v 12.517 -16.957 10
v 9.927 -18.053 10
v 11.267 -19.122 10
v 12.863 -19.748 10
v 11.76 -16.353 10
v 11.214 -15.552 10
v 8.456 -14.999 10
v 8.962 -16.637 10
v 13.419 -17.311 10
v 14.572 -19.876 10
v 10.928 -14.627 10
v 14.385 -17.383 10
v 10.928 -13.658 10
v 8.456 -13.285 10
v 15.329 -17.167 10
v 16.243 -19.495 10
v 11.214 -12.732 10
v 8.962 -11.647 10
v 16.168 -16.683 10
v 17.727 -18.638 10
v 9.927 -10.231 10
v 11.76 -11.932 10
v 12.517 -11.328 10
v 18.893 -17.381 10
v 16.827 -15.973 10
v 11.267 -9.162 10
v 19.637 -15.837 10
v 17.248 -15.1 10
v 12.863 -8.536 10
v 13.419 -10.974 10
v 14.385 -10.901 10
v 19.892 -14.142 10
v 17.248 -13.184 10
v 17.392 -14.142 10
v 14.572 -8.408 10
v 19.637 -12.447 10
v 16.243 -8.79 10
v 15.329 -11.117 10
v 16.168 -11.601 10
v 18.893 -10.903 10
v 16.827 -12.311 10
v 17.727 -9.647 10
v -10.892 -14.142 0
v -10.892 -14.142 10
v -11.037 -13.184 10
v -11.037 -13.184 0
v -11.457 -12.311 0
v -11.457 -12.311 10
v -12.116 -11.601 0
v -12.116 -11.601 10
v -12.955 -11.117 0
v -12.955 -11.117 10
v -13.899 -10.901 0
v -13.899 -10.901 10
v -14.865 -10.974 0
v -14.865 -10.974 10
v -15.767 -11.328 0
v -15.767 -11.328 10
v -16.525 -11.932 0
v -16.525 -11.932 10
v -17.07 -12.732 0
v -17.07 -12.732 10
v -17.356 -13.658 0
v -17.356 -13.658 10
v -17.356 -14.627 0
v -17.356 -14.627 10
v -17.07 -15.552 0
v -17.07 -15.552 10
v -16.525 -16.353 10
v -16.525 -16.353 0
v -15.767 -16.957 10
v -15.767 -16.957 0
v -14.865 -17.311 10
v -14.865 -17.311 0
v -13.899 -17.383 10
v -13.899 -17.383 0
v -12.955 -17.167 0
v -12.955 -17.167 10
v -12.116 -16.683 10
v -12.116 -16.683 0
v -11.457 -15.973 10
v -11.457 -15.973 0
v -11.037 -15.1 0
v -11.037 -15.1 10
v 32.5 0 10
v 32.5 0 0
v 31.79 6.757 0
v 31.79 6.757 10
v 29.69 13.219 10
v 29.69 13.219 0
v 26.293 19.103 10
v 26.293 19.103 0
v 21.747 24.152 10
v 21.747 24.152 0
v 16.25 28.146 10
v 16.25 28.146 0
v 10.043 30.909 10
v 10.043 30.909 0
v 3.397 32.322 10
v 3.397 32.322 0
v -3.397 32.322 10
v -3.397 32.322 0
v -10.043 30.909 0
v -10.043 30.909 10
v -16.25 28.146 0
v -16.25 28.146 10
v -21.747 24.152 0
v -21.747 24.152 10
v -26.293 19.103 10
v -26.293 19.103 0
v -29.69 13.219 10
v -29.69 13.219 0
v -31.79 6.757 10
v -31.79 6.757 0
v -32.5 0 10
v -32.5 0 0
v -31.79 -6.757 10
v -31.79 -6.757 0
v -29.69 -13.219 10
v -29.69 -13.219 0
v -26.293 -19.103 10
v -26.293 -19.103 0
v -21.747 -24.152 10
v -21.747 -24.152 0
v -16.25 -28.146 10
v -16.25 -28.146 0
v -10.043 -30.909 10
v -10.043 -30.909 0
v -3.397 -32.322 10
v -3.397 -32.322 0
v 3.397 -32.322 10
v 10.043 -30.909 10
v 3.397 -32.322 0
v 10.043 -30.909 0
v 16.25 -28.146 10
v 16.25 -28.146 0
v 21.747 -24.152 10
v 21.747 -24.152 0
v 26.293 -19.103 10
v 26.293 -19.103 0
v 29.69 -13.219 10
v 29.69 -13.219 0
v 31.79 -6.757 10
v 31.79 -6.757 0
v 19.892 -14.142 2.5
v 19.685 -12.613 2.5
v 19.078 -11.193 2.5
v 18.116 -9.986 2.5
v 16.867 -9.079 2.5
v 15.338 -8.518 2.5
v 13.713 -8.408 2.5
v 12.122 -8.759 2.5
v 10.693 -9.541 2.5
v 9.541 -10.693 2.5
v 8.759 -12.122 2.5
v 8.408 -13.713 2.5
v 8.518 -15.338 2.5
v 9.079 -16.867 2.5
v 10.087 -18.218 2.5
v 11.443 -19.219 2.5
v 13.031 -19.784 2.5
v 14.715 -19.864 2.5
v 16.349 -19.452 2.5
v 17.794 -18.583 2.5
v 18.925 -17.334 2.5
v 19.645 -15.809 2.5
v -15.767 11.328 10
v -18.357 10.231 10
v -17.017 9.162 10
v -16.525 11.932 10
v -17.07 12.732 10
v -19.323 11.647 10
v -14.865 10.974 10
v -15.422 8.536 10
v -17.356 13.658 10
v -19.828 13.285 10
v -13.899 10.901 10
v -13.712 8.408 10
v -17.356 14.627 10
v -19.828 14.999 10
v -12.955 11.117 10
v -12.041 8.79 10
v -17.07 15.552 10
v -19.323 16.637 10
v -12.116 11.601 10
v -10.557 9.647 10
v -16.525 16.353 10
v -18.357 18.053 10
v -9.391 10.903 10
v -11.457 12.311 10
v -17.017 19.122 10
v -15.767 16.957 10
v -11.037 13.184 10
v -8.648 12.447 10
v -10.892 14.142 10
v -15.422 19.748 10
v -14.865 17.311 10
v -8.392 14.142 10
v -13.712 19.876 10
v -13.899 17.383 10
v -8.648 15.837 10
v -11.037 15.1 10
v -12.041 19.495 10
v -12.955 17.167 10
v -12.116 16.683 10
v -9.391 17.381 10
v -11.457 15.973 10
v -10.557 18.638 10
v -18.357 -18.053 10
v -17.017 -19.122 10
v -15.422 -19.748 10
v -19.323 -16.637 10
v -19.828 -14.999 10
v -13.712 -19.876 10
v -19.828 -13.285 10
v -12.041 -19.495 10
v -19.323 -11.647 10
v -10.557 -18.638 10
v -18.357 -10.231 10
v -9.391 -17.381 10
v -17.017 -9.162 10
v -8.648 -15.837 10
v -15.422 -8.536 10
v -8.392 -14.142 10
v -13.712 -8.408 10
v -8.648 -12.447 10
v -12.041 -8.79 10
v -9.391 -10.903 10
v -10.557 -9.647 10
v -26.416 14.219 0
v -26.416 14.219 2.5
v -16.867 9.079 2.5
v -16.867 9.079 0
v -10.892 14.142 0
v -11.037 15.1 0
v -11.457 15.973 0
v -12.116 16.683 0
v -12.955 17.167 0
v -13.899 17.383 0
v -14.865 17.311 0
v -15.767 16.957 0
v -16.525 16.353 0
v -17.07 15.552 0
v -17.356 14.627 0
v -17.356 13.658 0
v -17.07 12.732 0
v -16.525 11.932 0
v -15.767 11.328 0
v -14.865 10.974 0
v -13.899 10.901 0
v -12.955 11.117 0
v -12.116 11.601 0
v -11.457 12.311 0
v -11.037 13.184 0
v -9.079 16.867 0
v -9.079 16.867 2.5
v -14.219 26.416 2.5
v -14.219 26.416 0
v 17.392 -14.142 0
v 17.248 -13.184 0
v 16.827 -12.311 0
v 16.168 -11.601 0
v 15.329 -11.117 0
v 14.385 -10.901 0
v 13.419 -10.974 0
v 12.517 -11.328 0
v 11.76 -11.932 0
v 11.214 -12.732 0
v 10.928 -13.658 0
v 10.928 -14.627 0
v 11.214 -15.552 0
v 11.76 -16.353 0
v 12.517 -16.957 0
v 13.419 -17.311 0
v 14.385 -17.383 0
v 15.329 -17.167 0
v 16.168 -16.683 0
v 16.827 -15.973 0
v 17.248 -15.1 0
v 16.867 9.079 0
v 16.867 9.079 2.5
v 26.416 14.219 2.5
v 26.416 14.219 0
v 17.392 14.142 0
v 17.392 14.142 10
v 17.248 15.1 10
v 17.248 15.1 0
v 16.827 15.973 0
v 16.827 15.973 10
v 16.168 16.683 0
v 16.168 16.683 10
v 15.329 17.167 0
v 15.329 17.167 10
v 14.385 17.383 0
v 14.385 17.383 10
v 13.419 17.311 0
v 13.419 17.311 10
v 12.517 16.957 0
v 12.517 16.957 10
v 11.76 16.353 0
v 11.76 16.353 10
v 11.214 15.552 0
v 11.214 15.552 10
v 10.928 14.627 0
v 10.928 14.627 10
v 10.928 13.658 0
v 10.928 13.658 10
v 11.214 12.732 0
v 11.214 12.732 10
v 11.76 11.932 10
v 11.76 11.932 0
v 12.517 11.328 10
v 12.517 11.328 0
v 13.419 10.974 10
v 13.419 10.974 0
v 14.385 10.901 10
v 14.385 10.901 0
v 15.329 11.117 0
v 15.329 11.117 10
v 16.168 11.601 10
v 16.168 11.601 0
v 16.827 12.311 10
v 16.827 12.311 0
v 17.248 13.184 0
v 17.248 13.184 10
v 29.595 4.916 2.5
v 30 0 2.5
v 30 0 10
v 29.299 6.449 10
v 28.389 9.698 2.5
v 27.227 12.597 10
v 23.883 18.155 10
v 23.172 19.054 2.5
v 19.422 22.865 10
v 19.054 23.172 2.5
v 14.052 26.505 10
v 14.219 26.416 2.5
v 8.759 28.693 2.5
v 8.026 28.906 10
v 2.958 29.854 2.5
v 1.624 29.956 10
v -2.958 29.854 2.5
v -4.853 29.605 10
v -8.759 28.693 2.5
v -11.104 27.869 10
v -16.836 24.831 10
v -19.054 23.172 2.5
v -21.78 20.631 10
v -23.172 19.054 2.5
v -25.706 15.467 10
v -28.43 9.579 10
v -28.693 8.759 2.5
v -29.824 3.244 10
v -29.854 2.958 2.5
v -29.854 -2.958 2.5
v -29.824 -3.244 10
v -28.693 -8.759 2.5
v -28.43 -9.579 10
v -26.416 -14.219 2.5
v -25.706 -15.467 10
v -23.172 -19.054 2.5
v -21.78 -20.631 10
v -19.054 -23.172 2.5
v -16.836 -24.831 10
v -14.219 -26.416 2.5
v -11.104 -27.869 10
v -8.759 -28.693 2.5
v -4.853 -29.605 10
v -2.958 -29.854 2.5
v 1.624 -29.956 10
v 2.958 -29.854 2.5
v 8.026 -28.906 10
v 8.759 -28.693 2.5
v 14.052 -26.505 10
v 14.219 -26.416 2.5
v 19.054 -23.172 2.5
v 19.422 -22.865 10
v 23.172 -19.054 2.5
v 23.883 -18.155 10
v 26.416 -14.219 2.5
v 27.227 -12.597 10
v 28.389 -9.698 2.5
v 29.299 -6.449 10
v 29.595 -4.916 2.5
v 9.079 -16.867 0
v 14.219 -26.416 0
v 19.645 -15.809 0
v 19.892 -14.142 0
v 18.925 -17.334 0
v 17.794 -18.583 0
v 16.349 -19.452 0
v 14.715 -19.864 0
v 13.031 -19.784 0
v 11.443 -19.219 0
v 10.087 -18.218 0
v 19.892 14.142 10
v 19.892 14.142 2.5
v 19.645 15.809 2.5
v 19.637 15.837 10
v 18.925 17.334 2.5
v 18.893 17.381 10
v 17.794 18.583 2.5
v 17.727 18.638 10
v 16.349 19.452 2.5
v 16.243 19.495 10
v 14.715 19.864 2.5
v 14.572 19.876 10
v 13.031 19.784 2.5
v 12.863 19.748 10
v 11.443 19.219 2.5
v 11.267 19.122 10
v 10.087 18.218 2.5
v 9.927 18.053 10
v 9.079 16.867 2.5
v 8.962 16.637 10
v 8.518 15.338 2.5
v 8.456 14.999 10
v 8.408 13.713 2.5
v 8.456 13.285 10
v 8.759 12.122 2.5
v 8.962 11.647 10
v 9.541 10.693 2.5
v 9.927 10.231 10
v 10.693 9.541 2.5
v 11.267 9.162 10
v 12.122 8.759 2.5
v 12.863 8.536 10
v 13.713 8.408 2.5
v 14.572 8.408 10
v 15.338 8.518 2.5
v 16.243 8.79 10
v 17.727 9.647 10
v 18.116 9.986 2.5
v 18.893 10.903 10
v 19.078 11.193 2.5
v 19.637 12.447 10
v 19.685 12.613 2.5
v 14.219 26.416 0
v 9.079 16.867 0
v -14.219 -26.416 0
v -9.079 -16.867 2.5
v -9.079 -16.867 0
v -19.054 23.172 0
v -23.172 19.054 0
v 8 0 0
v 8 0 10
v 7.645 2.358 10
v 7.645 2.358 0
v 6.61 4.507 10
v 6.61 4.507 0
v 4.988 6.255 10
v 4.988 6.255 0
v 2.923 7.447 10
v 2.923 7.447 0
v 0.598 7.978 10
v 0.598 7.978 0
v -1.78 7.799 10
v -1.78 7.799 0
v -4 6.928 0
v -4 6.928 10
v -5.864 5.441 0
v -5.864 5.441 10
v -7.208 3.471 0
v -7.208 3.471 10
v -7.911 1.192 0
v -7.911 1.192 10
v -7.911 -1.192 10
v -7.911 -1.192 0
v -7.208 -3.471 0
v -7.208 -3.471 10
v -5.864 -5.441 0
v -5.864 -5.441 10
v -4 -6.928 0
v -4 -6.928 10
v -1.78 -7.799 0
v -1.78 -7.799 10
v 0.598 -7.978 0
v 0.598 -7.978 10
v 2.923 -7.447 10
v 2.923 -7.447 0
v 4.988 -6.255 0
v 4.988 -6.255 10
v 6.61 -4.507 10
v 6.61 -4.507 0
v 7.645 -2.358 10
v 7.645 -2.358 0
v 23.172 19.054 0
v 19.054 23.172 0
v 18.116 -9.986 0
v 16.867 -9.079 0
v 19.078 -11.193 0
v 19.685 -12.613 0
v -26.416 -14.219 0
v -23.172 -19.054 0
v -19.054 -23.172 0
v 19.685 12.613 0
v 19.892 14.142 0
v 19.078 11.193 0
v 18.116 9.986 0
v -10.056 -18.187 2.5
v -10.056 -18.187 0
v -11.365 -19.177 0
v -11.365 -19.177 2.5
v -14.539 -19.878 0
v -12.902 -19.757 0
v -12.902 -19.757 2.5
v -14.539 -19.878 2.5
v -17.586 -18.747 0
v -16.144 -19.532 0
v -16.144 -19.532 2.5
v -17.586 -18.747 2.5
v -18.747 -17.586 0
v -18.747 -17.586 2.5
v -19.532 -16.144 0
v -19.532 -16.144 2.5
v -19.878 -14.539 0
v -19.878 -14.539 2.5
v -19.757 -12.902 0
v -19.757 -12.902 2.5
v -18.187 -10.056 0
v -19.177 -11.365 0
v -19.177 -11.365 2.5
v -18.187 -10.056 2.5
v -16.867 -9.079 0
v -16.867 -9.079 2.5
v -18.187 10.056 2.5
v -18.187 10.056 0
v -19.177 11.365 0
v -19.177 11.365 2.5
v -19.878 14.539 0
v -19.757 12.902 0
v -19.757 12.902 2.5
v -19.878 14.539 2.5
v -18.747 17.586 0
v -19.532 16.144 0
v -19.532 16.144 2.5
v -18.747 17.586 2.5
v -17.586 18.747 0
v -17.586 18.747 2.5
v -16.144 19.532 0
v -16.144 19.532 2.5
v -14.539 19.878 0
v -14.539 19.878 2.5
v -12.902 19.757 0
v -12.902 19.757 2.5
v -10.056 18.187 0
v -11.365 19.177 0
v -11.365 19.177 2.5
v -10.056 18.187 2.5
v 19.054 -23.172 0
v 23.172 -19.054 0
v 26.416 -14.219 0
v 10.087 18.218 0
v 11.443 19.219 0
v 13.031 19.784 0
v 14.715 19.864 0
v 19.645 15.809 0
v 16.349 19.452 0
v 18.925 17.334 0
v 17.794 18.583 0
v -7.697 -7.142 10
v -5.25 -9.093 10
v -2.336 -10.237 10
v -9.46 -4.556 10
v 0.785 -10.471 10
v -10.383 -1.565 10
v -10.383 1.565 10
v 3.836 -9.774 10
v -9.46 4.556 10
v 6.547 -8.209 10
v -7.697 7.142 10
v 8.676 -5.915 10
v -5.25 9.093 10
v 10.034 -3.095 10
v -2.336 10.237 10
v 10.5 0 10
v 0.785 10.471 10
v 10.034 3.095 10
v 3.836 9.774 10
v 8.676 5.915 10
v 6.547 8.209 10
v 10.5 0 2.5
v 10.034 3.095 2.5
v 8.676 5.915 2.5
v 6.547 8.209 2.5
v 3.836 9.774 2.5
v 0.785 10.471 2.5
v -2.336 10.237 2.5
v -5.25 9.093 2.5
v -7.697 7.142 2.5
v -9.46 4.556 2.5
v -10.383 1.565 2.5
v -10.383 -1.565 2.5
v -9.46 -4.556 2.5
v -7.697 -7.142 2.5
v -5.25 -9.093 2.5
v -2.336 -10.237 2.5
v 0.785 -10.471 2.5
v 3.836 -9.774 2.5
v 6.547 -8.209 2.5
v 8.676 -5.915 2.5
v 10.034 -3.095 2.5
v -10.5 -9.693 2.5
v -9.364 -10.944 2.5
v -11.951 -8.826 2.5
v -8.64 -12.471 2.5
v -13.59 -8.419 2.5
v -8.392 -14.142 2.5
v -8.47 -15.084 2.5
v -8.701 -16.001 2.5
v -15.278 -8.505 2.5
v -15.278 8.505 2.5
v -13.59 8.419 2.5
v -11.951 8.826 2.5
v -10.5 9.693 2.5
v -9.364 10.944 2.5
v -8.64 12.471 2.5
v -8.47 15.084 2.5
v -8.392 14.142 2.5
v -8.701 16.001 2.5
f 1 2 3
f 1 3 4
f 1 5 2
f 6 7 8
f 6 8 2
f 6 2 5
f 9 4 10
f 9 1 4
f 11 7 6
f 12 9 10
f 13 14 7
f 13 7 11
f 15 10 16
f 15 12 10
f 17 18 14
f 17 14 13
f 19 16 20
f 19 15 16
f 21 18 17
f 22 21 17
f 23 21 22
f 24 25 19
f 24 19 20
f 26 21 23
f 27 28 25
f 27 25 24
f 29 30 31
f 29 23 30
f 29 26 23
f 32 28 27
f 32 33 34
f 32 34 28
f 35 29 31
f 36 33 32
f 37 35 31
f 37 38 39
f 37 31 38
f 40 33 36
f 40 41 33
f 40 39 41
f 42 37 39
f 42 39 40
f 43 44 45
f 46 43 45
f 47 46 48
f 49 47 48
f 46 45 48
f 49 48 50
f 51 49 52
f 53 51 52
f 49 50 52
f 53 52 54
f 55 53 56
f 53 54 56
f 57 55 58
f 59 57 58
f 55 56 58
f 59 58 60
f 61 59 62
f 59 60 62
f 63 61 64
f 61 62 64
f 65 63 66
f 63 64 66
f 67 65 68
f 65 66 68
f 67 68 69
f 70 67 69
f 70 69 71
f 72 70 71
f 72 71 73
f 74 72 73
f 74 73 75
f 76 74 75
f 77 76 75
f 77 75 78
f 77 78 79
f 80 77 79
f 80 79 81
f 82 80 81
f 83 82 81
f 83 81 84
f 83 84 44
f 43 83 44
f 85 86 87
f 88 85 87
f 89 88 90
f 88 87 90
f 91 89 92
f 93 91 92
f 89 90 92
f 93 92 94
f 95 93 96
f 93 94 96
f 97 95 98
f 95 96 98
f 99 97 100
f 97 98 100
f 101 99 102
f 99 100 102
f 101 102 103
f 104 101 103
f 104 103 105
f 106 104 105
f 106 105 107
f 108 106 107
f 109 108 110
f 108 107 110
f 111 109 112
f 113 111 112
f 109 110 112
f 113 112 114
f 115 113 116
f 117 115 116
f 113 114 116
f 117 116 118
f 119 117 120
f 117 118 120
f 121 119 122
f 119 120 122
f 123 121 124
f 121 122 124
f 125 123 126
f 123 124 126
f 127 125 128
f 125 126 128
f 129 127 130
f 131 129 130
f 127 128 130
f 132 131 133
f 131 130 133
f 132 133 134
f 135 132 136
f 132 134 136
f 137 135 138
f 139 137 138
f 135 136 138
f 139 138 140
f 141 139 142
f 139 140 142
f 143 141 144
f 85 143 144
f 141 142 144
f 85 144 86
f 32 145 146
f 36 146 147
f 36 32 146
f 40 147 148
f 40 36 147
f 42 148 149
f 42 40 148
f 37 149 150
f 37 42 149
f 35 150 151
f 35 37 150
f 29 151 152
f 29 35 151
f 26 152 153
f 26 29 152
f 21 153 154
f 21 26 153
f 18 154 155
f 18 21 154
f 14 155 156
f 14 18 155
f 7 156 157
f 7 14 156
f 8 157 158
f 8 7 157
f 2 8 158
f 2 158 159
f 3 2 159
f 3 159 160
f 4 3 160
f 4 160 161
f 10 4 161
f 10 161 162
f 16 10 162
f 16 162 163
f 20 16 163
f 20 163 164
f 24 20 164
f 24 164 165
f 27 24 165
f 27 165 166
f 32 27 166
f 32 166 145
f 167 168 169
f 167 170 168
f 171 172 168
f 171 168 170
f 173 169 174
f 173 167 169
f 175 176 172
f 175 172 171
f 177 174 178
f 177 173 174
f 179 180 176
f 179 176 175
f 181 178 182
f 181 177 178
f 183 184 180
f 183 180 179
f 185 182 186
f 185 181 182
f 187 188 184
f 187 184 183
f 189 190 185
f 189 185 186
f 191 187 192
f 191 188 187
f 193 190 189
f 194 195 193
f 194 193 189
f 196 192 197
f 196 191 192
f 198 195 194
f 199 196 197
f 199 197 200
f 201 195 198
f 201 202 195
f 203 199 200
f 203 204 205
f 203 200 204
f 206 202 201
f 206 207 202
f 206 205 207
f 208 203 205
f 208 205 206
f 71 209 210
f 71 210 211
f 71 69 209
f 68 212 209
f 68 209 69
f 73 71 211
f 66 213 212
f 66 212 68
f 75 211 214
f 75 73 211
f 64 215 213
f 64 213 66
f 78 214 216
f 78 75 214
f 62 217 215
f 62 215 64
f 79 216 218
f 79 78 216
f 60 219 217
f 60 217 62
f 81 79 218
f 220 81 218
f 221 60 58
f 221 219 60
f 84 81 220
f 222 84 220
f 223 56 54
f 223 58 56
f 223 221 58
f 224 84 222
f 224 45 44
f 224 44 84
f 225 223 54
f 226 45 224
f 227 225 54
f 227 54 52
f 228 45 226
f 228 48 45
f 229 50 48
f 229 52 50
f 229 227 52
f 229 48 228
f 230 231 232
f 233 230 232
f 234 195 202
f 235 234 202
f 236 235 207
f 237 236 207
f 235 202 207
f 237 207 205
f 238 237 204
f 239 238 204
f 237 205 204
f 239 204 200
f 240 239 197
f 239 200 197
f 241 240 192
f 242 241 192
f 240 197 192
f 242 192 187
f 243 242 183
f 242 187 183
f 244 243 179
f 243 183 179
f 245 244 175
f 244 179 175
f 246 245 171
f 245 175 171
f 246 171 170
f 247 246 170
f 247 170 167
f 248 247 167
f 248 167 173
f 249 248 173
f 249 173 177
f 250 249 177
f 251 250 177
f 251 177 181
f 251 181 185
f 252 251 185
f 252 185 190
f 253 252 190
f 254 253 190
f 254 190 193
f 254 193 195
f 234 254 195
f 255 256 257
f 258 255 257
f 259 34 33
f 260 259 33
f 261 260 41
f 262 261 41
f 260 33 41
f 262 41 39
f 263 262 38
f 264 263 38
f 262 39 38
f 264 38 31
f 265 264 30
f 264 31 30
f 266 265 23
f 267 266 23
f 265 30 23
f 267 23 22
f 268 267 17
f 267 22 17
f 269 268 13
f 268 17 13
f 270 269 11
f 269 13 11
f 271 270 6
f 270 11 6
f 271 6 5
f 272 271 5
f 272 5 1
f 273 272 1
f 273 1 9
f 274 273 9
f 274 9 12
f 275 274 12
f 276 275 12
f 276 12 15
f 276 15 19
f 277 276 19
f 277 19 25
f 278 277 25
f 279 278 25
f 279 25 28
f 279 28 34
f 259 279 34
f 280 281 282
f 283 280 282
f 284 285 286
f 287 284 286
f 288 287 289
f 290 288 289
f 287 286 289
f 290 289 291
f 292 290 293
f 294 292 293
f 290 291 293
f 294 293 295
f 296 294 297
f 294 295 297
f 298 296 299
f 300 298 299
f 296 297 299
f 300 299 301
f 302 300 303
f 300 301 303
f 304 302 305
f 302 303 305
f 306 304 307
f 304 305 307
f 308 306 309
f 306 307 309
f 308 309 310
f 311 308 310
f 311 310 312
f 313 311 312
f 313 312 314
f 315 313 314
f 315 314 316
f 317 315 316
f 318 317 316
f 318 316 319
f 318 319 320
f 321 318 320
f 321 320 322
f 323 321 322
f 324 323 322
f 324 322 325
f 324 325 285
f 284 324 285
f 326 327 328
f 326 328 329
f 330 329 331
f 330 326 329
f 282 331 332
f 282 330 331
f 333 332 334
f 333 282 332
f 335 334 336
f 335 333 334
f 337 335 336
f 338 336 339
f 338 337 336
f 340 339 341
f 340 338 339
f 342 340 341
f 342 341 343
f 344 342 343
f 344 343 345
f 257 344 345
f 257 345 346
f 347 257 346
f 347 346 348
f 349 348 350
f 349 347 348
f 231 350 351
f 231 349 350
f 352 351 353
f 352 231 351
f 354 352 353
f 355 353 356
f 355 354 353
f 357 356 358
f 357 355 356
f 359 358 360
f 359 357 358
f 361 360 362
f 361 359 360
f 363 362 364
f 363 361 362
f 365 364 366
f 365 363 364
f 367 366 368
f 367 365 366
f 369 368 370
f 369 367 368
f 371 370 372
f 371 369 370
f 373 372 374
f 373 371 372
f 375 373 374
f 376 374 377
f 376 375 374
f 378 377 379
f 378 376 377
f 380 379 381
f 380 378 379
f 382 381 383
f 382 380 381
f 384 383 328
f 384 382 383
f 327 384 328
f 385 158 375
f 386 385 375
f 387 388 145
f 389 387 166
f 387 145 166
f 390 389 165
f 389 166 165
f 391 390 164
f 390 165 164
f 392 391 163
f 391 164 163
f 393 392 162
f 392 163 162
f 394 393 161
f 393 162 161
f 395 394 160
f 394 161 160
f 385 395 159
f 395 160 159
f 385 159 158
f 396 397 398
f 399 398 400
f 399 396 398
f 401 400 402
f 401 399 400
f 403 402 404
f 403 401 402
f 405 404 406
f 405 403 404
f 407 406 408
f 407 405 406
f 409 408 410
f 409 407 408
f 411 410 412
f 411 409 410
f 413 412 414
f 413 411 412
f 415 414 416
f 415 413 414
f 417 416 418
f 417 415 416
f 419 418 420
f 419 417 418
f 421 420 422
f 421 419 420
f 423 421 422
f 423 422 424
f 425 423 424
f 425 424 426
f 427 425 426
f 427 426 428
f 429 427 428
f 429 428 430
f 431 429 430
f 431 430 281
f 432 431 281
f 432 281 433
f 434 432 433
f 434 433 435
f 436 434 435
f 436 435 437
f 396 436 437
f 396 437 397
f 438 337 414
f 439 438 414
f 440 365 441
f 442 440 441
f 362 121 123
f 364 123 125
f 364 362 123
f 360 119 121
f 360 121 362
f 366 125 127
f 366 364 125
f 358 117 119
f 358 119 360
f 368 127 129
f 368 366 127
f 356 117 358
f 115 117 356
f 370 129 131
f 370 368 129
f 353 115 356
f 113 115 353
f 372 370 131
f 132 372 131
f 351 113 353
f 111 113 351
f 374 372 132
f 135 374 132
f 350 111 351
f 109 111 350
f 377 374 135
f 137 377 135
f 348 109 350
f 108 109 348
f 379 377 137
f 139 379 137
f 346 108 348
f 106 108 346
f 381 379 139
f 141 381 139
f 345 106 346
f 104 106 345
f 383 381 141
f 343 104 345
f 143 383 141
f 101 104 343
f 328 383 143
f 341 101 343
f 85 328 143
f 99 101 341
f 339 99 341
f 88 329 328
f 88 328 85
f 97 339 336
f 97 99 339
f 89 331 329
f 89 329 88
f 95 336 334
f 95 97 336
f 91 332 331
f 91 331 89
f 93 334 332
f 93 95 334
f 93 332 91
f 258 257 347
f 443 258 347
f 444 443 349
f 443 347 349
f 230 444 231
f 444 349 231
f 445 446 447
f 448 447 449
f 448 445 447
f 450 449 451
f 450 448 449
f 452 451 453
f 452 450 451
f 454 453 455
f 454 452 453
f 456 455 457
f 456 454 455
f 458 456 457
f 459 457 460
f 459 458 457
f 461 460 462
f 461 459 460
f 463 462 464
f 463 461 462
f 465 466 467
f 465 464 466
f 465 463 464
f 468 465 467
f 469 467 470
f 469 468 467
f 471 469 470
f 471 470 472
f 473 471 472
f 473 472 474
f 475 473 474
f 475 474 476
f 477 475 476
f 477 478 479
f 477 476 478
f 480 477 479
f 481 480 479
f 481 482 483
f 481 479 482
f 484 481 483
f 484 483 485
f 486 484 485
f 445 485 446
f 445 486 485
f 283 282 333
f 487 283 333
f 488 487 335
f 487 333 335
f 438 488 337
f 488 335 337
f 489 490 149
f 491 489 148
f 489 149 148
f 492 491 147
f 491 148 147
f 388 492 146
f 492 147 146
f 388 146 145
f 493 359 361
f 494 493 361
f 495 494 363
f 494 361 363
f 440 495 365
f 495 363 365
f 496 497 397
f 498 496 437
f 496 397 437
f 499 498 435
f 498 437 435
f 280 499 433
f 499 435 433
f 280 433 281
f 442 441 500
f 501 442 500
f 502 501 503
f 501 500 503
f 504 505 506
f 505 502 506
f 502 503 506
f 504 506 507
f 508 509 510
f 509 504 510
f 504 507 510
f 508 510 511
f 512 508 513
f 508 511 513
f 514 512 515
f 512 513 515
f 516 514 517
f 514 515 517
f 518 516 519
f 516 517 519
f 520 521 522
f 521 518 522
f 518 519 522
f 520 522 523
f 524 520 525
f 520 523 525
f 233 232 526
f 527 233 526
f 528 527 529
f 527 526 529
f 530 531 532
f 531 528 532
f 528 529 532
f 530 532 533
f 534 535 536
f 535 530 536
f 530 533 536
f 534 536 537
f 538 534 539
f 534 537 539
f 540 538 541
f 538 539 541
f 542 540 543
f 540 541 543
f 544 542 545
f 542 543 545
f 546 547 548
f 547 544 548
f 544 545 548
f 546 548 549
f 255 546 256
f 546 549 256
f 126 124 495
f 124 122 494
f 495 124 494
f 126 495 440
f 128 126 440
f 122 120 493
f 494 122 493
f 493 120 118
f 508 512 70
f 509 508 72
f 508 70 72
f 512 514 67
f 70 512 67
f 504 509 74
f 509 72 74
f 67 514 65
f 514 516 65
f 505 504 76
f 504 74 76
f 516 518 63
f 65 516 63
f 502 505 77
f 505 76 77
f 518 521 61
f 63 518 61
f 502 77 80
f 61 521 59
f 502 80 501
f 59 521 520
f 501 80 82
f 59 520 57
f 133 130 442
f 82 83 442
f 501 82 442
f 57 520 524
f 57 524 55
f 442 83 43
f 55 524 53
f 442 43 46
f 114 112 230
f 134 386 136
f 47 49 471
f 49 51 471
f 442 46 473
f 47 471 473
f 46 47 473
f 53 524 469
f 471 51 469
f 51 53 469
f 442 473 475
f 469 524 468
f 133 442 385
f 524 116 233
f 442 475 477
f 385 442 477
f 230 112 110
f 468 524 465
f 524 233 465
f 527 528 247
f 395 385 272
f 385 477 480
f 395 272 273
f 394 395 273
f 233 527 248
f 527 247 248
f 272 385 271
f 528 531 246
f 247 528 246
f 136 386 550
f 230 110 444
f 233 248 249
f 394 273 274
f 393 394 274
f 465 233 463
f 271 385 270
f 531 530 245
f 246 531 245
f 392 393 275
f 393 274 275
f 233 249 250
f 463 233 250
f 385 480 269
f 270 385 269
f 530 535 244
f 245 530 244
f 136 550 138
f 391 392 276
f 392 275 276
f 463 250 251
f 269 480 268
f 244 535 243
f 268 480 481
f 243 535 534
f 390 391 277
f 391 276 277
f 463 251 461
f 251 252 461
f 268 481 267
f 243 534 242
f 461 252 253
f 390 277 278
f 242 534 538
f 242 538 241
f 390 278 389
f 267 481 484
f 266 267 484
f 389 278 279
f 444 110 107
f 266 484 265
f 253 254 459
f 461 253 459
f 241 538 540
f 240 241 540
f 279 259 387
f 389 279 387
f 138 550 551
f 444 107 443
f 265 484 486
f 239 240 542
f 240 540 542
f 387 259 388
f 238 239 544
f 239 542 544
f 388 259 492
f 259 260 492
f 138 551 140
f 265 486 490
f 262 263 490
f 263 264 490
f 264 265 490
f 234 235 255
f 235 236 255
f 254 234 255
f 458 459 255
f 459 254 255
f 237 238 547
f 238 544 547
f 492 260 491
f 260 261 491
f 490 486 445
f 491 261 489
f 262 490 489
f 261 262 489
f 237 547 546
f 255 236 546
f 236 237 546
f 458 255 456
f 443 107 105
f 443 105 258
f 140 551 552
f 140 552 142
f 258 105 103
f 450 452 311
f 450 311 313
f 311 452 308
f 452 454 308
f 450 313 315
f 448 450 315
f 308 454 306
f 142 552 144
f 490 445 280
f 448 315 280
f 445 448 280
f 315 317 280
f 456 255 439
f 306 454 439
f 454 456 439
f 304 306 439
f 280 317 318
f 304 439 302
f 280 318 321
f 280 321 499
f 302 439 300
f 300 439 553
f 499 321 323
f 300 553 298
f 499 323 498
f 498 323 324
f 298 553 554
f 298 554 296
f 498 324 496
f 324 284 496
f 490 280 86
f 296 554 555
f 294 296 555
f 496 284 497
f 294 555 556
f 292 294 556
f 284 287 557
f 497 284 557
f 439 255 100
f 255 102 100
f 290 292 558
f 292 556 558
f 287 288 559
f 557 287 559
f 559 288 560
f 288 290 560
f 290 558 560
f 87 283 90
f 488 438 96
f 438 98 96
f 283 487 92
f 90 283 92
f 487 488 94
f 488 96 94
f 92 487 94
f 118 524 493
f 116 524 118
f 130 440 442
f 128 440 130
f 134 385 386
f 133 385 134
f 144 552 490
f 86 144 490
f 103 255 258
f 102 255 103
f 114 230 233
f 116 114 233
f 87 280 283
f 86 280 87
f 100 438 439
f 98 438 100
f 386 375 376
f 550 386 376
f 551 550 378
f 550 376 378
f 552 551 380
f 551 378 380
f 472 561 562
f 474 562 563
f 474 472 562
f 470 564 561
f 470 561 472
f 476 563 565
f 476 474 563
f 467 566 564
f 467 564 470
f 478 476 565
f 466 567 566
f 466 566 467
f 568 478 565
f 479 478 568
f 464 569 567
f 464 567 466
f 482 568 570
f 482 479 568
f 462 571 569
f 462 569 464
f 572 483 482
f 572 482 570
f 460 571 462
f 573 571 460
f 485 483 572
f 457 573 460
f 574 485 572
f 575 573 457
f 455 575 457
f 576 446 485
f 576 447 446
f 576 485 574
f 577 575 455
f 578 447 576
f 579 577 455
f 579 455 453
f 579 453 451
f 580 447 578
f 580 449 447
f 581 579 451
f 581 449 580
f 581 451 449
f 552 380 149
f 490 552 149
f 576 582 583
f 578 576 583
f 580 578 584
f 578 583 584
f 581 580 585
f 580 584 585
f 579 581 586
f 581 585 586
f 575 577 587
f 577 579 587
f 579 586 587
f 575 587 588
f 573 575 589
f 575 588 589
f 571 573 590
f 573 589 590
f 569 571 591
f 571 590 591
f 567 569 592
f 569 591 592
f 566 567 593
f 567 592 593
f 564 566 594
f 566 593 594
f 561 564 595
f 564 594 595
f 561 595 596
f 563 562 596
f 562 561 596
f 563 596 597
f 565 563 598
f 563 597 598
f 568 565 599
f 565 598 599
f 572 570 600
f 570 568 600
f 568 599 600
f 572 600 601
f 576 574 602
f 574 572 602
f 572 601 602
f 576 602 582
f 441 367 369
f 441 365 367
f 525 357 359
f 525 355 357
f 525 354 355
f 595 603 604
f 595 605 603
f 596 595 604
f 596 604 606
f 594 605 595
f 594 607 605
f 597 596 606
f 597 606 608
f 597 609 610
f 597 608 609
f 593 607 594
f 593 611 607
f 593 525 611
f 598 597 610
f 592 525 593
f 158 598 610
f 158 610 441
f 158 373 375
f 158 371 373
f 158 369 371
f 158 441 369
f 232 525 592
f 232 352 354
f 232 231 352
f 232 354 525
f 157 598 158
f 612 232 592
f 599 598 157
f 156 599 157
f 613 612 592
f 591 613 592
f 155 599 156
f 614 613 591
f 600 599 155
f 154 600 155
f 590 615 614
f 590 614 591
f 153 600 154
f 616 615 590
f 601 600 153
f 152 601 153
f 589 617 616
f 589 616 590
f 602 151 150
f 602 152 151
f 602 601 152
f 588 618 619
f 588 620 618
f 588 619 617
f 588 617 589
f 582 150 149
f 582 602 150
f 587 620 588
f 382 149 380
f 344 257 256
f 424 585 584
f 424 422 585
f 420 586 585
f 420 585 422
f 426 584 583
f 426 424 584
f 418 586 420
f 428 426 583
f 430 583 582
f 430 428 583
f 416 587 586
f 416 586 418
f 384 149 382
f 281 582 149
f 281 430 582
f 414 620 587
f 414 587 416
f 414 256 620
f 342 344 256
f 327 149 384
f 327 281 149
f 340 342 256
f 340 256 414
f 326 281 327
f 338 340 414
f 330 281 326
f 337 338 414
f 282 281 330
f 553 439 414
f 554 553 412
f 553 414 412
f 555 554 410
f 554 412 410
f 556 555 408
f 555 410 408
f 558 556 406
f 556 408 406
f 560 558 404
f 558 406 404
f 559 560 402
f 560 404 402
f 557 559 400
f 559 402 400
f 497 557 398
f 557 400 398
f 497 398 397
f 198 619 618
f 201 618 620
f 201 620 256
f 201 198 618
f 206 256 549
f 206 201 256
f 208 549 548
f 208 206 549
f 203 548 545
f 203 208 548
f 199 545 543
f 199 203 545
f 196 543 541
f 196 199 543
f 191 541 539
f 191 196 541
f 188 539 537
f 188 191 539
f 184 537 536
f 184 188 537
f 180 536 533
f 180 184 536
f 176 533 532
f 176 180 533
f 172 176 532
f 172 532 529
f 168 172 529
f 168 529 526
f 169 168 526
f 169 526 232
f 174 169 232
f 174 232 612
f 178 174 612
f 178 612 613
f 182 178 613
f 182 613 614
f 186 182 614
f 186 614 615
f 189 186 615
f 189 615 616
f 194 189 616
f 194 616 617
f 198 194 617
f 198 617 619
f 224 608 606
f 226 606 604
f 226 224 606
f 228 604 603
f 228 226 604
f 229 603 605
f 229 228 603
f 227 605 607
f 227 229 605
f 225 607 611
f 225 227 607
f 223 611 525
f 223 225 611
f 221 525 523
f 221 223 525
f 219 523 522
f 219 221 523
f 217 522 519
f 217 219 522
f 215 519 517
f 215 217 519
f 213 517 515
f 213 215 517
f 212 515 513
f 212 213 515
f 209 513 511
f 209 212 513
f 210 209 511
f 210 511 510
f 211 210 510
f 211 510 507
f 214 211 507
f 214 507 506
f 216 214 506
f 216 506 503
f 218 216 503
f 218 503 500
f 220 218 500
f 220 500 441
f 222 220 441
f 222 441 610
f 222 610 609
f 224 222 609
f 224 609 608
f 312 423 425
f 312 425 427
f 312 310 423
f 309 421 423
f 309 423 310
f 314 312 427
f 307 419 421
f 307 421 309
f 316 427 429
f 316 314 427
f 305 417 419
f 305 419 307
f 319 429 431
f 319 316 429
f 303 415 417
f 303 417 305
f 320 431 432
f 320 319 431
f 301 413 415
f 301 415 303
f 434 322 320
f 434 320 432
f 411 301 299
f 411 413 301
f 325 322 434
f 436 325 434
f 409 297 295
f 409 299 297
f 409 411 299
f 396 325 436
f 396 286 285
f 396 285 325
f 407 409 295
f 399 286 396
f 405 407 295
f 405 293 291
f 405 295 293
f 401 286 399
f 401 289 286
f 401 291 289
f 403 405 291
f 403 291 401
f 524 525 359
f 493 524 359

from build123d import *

# Parameters (mm, degrees)
F0_R     = 32.5
F1_DEPTH = 10
F2_R     = 8
F3_DEPTH = 25
F4_R     = 3.25
F5_DEPTH = 25
F6_T     = -2.5
F8_DEPTH = 25


with BuildPart() as f1:
    # F0 (on Top) → F1 (new body)
    with BuildSketch(Plane.XY):
        Circle(F0_R)
    extrude(amount=F1_DEPTH)

    # F2 (on Top) → F3 (cut)
    with BuildSketch(Plane.XY):
        Circle(F2_R)
    extrude(amount=F3_DEPTH, mode=Mode.SUBTRACT)

    # F4 (on face) → F5 (cut)
    with BuildSketch(Plane.XY.offset(10)):
        with Locations((-14.1421356237, 14.1421356237)):
            Circle(F4_R)
        with Locations((-14.1421356237, -14.1421356237)):
            Circle(F4_R)
        with Locations((14.1421356237, 14.1421356237)):
            Circle(F4_R)
        with Locations((14.1421356237, -14.1421356237)):
            Circle(F4_R)
    extrude(amount=-F5_DEPTH, mode=Mode.SUBTRACT)

    # F6
    f6_openings = [f1.faces().sort_by_distance(p)[0] for p in [
        (-31.580761, 0, 10),
    ]]
    offset(amount=F6_T, openings=f6_openings)

    # F7 (on face) → F8 (cut)
    with BuildSketch(Plane.XY.offset(2.5)):
        with BuildLine():
            ThreePointArc((19.8921356237, 14.1421356237), (19.0783691058, 11.1932207368), (16.8674055331, 9.0789939191))
            Line((16.8674055331, 9.0789939191), (26.4163915025, 14.218799527))
            ThreePointArc((26.4163915025, 14.218799527), (21.2132034356, 21.2132034356), (14.218799527, 26.4163915025))
            Line((14.218799527, 26.4163915025), (9.0789939191, 16.8674055331))
            ThreePointArc((9.0789939191, 16.8674055331), (15.5473820787, 19.7177775061), (19.8921356237, 14.1421356237))
        make_face()
        with BuildLine():
            Line((-9.0789939191, 16.8674055331), (-14.218799527, 26.4163915025))
            ThreePointArc((-14.218799527, 26.4163915025), (-21.2132034356, 21.2132034356), (-26.4163915025, 14.218799527))
            Line((-26.4163915025, 14.218799527), (-16.8674055331, 9.0789939191))
            ThreePointArc((-16.8674055331, 9.0789939191), (-18.2079996156, 18.2079996156), (-9.0789939191, 16.8674055331))
        make_face()
        with BuildLine():
            ThreePointArc((14.218799527, -26.4163915025), (21.2132034356, -21.2132034356), (26.4163915025, -14.218799527))
            Line((26.4163915025, -14.218799527), (16.8674055331, -9.0789939191))
            ThreePointArc((16.8674055331, -9.0789939191), (19.0783691058, -11.1932207368), (19.8921356237, -14.1421356237))
            ThreePointArc((19.8921356237, -14.1421356237), (15.5473820787, -19.7177775061), (9.0789939191, -16.8674055331))
            Line((9.0789939191, -16.8674055331), (14.218799527, -26.4163915025))
        make_face()
        with BuildLine():
            ThreePointArc((-26.4163915025, -14.218799527), (-21.2132034356, -21.2132034356), (-14.218799527, -26.4163915025))
            Line((-14.218799527, -26.4163915025), (-9.0789939191, -16.8674055331))
            ThreePointArc((-9.0789939191, -16.8674055331), (-18.2079996156, -18.2079996156), (-16.8674055331, -9.0789939191))
            Line((-16.8674055331, -9.0789939191), (-26.4163915025, -14.218799527))
        make_face()
    extrude(amount=-F8_DEPTH, mode=Mode.SUBTRACT)


solid = f1.part
